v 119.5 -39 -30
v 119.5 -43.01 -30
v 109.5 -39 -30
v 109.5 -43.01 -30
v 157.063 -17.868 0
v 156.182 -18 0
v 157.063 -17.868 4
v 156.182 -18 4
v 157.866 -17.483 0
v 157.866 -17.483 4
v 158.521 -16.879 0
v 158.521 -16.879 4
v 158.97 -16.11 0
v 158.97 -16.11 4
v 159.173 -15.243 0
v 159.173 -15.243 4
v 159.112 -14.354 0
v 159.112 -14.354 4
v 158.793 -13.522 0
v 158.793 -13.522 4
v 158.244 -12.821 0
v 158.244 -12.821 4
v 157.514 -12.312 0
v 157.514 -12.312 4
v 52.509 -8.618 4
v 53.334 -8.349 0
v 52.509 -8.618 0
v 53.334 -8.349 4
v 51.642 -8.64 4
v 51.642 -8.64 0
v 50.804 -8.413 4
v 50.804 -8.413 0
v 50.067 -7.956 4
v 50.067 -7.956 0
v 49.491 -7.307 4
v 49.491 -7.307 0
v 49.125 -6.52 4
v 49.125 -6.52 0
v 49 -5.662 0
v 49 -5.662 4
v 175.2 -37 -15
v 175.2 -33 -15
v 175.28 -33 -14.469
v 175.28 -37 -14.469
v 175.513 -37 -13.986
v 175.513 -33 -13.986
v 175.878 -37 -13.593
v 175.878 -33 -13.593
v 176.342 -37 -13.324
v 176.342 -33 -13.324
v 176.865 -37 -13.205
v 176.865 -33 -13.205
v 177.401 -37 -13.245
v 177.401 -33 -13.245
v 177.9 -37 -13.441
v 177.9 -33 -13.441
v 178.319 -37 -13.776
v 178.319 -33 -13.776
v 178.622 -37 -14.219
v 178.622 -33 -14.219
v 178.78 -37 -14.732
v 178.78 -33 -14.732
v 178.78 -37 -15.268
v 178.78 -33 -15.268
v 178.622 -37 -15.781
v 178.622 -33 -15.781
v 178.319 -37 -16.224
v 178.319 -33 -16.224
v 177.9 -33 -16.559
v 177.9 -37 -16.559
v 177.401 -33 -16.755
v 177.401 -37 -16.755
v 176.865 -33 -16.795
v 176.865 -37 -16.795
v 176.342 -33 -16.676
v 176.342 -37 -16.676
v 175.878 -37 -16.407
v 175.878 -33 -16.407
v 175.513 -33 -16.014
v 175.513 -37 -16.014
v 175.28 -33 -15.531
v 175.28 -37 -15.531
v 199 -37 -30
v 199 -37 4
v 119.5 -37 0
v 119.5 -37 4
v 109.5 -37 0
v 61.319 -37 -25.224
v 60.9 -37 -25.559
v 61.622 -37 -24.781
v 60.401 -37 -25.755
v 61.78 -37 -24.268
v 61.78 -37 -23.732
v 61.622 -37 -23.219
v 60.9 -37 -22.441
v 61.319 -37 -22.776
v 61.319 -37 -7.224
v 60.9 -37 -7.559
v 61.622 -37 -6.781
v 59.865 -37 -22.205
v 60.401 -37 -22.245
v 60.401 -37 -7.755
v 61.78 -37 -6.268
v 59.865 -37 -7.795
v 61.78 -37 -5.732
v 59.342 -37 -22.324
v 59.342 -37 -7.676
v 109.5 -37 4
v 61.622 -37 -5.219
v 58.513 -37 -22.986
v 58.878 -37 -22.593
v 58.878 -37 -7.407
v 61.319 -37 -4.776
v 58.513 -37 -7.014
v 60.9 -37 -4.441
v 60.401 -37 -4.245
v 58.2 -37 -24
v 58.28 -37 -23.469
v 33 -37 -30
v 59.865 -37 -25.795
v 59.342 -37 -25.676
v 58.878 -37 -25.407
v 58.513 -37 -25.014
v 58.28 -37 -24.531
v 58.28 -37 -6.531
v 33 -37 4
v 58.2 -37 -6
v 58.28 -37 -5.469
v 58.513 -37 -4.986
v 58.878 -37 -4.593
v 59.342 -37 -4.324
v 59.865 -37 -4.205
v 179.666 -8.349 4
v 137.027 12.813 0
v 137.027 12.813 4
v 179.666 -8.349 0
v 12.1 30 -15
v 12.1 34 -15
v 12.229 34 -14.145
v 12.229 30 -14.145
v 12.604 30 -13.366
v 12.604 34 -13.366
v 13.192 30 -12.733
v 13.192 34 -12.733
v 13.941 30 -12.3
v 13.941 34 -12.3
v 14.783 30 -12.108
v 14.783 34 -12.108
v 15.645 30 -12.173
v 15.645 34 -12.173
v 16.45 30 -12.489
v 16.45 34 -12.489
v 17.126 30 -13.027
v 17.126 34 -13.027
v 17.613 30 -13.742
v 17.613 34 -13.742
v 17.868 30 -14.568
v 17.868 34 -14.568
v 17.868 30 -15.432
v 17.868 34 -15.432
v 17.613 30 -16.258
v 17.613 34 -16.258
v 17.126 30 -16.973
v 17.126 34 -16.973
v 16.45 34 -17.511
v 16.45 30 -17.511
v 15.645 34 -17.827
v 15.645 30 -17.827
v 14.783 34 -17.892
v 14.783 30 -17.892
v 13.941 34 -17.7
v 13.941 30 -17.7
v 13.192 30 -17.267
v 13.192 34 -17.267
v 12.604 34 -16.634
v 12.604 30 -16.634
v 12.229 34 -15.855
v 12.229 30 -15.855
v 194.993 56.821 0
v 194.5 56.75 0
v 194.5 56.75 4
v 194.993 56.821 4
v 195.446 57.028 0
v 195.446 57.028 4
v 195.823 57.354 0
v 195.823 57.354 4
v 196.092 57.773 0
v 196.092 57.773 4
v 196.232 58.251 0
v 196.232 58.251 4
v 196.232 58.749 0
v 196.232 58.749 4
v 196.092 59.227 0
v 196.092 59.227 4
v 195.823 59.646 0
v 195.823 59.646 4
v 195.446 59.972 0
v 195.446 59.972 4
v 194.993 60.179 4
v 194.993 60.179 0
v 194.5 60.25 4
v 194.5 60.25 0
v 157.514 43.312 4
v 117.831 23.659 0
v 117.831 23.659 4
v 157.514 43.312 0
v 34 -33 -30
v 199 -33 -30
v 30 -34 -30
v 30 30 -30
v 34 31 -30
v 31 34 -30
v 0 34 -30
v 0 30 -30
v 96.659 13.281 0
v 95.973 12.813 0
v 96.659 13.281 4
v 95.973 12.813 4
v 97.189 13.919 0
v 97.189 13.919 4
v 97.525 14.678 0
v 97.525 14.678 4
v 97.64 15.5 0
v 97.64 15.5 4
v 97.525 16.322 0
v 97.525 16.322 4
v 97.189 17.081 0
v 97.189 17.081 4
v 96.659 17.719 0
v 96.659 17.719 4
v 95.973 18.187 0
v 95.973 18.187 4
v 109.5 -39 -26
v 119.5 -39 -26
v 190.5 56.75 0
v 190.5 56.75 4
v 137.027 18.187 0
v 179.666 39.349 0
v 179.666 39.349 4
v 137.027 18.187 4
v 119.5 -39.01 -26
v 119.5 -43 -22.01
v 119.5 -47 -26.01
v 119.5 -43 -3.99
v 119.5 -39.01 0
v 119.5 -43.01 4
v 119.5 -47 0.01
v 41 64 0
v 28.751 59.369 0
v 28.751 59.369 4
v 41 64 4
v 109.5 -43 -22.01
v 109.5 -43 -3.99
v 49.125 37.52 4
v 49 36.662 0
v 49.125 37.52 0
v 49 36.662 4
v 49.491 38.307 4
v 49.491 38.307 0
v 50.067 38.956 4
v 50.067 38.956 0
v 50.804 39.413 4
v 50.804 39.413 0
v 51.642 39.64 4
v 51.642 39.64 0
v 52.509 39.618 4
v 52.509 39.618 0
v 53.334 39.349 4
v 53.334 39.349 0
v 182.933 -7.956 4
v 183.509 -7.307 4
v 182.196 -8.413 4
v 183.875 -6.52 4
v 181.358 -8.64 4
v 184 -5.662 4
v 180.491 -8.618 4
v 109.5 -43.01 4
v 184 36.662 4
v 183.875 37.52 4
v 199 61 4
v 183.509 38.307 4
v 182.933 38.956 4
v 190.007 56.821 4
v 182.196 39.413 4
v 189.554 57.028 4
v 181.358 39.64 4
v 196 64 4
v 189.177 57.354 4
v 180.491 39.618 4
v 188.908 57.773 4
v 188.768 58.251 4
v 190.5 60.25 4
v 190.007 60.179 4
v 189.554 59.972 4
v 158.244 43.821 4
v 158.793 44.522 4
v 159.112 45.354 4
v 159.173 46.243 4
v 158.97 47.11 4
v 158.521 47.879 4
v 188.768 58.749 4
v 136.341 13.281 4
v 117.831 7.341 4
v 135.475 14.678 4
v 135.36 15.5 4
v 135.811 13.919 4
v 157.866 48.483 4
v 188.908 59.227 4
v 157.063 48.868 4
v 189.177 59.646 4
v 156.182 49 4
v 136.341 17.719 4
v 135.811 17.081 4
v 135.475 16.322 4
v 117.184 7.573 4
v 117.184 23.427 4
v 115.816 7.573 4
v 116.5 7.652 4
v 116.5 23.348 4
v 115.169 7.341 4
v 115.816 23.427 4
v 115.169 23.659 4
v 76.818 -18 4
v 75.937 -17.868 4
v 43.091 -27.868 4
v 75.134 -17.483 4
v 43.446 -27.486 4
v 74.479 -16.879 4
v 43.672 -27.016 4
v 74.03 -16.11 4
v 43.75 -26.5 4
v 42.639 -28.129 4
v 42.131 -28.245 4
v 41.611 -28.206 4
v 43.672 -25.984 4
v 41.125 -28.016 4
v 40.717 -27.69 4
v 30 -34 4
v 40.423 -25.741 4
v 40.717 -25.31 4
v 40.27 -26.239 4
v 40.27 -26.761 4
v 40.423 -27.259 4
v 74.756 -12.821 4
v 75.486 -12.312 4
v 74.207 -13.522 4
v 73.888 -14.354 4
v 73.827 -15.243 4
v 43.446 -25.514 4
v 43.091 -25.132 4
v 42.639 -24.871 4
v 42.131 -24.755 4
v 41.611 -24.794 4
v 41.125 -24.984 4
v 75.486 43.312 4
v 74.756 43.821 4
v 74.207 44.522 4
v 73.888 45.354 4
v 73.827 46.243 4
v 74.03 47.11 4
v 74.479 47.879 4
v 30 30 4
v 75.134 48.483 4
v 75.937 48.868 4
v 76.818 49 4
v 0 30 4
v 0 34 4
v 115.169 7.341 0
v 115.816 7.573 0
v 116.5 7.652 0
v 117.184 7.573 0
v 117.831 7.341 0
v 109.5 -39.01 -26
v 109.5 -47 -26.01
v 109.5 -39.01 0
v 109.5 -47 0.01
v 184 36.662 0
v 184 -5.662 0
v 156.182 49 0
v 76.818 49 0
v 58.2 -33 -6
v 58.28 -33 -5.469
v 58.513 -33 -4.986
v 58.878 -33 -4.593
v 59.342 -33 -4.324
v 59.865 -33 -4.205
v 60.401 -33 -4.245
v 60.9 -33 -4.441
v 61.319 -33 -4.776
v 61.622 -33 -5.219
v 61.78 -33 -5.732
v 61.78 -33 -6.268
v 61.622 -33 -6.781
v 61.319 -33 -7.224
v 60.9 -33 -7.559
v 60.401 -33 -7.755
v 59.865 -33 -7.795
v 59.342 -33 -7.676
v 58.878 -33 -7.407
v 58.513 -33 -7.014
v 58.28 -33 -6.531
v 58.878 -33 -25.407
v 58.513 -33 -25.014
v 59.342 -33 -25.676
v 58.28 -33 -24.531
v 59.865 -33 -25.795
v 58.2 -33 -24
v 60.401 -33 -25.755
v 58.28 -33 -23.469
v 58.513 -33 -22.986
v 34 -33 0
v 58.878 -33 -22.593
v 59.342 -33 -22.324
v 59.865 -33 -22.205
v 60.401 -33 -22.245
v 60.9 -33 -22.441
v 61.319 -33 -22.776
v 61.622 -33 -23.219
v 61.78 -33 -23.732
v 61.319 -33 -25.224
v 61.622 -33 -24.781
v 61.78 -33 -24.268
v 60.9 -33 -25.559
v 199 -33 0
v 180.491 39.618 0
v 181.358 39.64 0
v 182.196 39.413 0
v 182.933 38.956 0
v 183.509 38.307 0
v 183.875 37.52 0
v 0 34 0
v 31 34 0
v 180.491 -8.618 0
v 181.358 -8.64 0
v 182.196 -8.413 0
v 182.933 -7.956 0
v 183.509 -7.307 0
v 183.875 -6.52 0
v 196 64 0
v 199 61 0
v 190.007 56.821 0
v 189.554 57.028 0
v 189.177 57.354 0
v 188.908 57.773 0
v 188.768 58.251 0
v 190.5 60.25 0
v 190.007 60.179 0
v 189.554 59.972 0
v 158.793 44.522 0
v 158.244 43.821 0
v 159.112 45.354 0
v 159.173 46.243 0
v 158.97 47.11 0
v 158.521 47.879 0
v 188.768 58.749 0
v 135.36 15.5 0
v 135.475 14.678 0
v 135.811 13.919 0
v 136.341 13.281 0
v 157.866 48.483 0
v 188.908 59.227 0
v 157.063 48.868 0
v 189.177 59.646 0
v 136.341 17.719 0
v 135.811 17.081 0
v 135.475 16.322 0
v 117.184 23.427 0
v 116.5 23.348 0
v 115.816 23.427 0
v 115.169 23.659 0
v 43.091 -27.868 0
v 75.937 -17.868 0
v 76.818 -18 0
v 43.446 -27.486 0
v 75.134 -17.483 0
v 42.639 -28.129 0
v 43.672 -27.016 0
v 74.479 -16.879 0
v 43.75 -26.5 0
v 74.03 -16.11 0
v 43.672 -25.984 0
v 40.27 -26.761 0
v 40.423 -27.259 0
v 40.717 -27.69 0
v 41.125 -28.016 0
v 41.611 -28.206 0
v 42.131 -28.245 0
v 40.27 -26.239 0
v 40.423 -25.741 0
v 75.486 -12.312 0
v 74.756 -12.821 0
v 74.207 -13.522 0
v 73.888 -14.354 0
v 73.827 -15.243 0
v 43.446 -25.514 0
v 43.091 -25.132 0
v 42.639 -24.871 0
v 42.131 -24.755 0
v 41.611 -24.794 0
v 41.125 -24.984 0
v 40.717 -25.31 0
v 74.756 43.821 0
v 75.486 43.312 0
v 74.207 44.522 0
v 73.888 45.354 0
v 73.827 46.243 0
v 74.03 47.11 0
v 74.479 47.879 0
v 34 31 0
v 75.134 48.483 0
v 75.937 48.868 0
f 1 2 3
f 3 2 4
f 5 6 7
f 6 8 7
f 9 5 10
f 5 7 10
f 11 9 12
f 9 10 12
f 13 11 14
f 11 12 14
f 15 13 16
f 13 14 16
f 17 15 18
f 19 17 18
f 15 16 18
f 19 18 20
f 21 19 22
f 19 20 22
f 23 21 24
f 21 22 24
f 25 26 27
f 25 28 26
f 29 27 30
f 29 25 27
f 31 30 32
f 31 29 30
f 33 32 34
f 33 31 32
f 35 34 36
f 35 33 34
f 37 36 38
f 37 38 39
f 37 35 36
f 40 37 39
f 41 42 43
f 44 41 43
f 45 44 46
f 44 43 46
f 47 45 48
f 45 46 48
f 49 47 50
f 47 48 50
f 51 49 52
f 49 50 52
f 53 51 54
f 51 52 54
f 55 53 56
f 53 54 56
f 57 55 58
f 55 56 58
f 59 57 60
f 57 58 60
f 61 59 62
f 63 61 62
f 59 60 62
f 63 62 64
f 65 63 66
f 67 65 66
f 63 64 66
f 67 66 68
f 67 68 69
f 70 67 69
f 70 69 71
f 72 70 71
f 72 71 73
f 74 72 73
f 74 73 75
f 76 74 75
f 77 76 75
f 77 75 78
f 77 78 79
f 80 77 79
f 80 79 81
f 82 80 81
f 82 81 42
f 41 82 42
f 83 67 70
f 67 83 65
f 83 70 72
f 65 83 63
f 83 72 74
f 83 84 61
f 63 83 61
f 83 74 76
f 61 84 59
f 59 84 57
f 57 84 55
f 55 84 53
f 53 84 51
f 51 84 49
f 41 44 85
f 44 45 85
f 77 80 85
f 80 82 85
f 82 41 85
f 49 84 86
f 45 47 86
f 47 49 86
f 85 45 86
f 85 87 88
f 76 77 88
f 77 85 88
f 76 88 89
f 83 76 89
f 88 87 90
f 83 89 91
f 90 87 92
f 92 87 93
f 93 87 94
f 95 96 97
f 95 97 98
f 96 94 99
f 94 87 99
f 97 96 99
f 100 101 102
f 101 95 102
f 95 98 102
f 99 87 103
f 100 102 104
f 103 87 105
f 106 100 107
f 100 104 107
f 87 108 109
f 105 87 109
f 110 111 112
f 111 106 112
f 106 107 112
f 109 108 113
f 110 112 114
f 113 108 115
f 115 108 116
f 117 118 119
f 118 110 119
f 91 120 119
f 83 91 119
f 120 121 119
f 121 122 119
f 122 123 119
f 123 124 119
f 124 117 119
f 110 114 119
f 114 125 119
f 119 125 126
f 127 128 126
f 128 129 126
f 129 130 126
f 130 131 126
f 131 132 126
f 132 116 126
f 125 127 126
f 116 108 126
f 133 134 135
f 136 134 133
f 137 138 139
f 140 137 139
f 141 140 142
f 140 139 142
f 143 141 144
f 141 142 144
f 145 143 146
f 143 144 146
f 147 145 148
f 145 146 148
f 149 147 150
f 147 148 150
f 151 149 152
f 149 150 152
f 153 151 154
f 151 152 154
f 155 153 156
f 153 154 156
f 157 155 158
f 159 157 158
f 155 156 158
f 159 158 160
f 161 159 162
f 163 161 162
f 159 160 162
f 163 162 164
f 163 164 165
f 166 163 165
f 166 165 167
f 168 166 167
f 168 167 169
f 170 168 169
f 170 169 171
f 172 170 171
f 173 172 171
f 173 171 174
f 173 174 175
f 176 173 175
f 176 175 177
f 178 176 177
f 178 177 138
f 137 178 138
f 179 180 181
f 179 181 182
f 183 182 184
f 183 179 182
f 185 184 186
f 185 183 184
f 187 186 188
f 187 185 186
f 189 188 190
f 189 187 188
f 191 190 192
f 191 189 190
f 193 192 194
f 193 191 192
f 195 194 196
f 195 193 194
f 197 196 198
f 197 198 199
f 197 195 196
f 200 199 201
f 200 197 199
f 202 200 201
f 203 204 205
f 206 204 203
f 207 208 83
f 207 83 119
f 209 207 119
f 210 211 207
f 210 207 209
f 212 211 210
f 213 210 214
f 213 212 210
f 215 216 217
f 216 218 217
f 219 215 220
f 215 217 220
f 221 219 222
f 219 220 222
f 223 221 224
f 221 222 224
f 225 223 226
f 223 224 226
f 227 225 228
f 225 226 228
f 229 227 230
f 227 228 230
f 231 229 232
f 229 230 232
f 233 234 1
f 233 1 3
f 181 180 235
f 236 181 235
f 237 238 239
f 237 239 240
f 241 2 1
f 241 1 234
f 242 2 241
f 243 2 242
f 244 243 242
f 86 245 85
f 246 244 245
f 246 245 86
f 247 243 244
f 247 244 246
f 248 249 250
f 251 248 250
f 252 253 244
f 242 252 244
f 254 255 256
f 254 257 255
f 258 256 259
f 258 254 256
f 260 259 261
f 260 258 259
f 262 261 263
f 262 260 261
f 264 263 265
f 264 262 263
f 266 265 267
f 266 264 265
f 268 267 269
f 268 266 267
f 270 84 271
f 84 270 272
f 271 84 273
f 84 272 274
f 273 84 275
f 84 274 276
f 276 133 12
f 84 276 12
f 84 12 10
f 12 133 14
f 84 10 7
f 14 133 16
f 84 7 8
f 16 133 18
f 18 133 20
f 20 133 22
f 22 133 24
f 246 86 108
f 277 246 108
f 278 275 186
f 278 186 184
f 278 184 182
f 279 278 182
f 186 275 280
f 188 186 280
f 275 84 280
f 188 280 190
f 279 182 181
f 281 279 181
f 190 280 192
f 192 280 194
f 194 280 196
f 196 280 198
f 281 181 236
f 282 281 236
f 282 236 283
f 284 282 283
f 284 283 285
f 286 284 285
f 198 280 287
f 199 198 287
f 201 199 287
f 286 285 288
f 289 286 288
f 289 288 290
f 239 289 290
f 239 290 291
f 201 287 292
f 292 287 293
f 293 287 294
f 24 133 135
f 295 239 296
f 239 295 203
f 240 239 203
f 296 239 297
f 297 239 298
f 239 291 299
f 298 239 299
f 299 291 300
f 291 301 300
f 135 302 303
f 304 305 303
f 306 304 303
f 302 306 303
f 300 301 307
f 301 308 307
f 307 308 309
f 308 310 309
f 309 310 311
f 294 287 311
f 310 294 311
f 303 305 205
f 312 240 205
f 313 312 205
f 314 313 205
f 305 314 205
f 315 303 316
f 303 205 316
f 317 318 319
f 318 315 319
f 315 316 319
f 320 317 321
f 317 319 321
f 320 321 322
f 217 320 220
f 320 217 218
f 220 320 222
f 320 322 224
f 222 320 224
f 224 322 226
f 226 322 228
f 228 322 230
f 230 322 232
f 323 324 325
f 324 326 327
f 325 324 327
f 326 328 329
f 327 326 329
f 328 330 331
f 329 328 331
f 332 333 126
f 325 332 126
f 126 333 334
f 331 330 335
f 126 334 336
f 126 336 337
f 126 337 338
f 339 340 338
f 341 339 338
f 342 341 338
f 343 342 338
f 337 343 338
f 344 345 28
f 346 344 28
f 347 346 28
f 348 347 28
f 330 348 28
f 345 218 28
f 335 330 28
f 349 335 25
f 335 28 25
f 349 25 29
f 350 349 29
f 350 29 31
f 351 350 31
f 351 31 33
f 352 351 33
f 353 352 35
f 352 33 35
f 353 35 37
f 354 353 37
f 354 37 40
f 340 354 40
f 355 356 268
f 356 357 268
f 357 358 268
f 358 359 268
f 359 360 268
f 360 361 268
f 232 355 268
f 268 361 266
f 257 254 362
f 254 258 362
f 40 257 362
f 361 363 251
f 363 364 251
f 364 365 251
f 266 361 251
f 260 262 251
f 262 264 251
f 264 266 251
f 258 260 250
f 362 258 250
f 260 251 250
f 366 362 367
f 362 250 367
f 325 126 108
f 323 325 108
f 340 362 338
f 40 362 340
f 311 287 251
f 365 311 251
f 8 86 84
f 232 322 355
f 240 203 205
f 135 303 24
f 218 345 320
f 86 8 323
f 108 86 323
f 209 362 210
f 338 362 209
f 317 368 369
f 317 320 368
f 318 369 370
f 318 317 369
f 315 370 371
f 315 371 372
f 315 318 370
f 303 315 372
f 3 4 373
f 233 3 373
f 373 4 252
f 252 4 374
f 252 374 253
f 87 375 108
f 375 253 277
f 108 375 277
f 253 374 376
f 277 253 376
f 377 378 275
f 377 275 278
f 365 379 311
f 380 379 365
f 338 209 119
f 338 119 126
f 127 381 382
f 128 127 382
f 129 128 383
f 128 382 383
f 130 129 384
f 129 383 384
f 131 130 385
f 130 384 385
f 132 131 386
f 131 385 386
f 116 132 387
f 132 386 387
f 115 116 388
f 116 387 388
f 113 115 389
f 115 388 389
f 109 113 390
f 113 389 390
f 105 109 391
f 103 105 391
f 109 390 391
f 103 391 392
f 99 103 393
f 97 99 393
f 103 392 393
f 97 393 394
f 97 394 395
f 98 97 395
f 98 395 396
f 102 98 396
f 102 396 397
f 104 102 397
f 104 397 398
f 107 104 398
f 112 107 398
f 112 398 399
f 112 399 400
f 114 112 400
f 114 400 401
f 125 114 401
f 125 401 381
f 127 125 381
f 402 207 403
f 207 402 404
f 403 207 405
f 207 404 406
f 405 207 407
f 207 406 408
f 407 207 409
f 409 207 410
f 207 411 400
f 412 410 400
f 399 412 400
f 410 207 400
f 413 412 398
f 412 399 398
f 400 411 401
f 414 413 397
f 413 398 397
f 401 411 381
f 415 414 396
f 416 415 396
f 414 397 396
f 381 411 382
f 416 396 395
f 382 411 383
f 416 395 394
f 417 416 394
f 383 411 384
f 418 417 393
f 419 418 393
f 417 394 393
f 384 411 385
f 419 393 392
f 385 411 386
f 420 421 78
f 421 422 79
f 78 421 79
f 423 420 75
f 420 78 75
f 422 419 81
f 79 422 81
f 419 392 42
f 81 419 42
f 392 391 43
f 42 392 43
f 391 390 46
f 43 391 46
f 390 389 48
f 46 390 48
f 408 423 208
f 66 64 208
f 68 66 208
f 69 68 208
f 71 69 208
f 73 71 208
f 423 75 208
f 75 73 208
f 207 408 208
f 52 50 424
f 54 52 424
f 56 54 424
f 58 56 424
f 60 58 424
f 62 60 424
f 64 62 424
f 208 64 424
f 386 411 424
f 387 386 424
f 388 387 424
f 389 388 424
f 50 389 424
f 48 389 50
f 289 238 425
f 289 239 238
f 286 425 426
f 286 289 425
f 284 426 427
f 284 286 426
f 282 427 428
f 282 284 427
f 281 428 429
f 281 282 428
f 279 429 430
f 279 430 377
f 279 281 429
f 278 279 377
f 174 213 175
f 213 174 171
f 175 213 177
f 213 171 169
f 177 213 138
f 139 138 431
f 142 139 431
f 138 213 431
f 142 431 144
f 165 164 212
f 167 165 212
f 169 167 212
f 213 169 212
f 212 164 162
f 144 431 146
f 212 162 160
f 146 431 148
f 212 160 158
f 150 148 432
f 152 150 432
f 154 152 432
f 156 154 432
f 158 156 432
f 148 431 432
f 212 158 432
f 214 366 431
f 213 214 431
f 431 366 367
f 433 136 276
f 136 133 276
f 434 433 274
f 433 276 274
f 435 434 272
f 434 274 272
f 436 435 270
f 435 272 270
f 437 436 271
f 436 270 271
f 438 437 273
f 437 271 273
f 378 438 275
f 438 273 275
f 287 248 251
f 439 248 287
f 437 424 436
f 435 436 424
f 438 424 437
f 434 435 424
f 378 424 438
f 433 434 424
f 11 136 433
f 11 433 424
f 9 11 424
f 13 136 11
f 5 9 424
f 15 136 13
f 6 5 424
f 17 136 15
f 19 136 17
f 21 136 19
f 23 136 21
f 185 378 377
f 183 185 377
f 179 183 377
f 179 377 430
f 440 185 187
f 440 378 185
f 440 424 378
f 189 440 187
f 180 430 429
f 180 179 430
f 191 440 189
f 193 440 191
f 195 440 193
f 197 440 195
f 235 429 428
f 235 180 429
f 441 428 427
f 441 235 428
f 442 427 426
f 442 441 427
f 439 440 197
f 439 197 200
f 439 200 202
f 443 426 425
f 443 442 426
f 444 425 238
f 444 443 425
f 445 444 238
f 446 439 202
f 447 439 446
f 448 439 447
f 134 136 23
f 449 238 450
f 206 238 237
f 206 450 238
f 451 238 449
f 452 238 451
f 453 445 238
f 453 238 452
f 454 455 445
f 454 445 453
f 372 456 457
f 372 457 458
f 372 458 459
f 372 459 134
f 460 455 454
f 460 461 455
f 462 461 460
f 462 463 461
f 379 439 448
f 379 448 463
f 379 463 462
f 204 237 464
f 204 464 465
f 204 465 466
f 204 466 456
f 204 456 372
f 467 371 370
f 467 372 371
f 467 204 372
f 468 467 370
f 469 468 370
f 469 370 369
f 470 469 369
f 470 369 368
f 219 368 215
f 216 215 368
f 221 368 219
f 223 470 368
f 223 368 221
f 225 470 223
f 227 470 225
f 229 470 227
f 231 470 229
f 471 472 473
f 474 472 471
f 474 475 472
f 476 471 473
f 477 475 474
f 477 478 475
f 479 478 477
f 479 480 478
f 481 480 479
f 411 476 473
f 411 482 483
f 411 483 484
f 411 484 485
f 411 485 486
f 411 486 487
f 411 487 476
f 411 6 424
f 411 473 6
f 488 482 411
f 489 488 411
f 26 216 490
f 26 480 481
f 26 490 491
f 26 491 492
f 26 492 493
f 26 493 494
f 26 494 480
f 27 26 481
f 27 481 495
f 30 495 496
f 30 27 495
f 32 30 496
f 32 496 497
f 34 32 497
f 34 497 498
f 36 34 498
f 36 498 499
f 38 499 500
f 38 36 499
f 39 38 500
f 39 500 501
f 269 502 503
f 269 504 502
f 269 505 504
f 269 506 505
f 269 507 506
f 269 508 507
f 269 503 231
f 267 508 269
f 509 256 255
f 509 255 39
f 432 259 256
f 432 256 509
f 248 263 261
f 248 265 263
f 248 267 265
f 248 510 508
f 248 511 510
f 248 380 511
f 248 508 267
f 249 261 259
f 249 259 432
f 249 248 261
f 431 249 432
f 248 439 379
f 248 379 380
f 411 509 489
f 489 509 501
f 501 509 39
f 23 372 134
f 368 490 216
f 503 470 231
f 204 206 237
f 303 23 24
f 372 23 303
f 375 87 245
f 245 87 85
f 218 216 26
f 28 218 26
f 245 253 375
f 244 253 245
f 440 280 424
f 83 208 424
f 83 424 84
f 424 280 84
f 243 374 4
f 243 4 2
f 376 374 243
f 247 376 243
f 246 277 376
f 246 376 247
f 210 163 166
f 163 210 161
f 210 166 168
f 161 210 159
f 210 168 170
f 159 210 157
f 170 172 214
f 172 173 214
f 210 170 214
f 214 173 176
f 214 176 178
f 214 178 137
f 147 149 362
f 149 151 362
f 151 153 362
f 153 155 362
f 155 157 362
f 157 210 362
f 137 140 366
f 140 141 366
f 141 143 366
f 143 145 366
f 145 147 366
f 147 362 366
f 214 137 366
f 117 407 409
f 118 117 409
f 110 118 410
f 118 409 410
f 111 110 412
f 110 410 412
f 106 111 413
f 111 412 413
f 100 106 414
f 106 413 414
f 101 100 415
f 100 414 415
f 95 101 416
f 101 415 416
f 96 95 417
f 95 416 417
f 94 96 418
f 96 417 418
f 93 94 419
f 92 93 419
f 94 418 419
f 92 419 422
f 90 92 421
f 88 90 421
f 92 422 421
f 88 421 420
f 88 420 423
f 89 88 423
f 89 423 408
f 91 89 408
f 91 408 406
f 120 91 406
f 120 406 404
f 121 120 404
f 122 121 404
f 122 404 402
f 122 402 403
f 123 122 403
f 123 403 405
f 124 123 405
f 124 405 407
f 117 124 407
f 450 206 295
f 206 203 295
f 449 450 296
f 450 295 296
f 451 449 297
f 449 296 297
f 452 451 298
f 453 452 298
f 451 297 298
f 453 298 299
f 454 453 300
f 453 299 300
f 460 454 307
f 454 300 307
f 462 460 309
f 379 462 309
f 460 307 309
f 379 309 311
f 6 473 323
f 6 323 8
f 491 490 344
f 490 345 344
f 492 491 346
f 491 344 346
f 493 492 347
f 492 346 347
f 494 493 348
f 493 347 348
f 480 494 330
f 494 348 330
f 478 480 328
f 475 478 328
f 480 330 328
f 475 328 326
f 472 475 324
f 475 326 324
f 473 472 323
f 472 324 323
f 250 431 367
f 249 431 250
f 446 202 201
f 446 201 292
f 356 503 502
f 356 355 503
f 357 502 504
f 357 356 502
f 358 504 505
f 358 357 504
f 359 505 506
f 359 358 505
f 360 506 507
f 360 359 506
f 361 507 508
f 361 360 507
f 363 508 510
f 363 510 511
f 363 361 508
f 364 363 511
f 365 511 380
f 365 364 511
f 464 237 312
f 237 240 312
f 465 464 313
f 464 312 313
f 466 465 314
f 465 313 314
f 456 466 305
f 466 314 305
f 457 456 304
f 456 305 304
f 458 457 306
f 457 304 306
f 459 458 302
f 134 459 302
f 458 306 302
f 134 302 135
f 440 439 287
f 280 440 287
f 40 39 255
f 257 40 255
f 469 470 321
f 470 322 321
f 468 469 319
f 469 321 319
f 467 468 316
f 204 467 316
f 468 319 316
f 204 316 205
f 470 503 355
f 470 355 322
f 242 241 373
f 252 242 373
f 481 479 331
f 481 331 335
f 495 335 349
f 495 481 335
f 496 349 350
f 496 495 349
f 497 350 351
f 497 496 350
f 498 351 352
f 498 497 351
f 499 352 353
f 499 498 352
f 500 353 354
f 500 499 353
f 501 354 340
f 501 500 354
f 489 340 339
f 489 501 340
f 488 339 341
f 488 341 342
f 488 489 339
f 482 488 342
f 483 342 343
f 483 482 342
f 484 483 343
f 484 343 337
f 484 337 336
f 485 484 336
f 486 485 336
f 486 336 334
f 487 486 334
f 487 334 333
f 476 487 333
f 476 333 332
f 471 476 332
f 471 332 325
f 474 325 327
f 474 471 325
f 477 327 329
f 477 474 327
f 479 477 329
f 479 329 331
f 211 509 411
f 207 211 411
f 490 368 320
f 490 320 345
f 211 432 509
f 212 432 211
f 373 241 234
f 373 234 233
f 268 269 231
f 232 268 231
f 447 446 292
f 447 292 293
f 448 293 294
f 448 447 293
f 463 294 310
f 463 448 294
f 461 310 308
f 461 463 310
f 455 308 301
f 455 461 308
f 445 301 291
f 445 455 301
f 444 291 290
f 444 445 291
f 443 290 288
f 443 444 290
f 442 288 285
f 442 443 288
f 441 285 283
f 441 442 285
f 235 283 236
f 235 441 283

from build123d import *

# Parameters (mm, degrees)
SKETCH_R        = 1.75
PAD_DEPTH       = 4
PAD001_DEPTH    = 34
FILLET_R        = 3
CHAMFER_SIZE    = 3
SKETCH006_R     = 2.9
HOLE_DEPTH      = 25
HOLE_TIPS_R     = 2.9
SKETCH007_R     = 1.8
HOLE001_DEPTH   = 25
CHAMFER001_SIZE = 3
CHAMFER002_SIZE = 7
SKETCH008_W     = 10
SKETCH008_H     = 10
PAD002_DEPTH    = 4
SKETCH009_W     = 10
SKETCH009_H     = 4
PAD003_DEPTH    = 30
SKETCH010_W     = 10
SKETCH010_H     = 4
PAD004_DEPTH    = 4
CHAMFER003_SIZE = 3.99


with BuildPart() as part:
    # Sketch → Pad (new body)
    with BuildSketch(Plane.XY):
        Polygon((30, 0), (30, 30), (0, 30), (0, 34), (34, 64), (199, 64), (199, -33), (199, -37), (30, -37), (30, -33), align=None)
        with Locations((42, -26.5)):
            Circle(SKETCH_R, mode=Mode.SUBTRACT)
        Polygon((64, 49), (116.5, 23), (169, 49), align=None, mode=Mode.SUBTRACT)
        Polygon((116.5, 8), (64, -18), (169, -18), align=None, mode=Mode.SUBTRACT)
        Polygon((49, 41.5), (101.38806, 15.5), (49, -10.5), align=None, mode=Mode.SUBTRACT)
        Polygon((184, 41.5), (131.61194, 15.5), (184, -10.5), align=None, mode=Mode.SUBTRACT)
        with BuildLine():
            ThreePointArc((194.5, 56.75), (196.25, 58.5), (194.499999, 60.25))
            Line((194.5, 60.25), (190.5, 60.25))
            ThreePointArc((190.500001, 60.25), (188.75, 58.5), (190.5, 56.75))
            Line((194.5, 56.75), (190.5, 56.75))
        make_face(mode=Mode.SUBTRACT)
    extrude(amount=PAD_DEPTH)

    # Sketch001 (on Face24 of Pad) → Pad001 (join)
    with BuildSketch(Plane.XY.offset(4)):
        Polygon((30, 0), (30, 30), (0, 30), (0, 34), (34, 34), (34, -33), (199, -33), (199, -37), (30, -37), (30, -33), align=None)
    extrude(amount=-PAD001_DEPTH)

    # Fillet
    fillet_edges = [part.edges().sort_by_distance(p)[0] for p in [
        (49, 41.5, 2),
        (101.38806, 15.5, 2),
        (49, -10.5, 2),
        (64, -18, 2),
        (116.5, 8, 2),
        (169, -18, 2),
        (184, -10.5, 2),
        (64, 49, 2),
        (116.5, 23, 2),
        (131.61194, 15.5, 2),
        (184, 41.5, 2),
        (169, 49, 2),
    ]]
    fillet(fillet_edges, radius=FILLET_R)

    # Chamfer
    chamfer_edges = [part.edges().sort_by_distance(p)[0] for p in [
        (199, 64, 2),
    ]]
    chamfer(chamfer_edges, length=CHAMFER_SIZE)

    # Sketch006 (on Face6 of Chamfer) → Hole (cut)
    with BuildSketch(Plane(origin=(0, 34, 0), x_dir=(-1, 0, 0), z_dir=(0, 1, 0))):
        with Locations((-15, -15)):
            Circle(SKETCH006_R)
    extrude(amount=-HOLE_DEPTH, mode=Mode.SUBTRACT)

    # Hole tips → Hole tip 1 section 0
    with BuildSketch(Plane(origin=(0, 9, 0), x_dir=(-1, 0, 0), z_dir=(0, 1, 0)), mode=Mode.PRIVATE) as hole_tip_1_s0:
        with Locations((-15, -15)):
            Circle(HOLE_TIPS_R)
    loft([hole_tip_1_s0.sketch, Vertex(15, 7.257504, -15)], mode=Mode.SUBTRACT)

    # Sketch007 (on Face7 of Hole) → Hole001 (cut)
    with BuildSketch(Plane(origin=(0, -33, 0), x_dir=(-1, 0, 0), z_dir=(0, 1, 0))):
        with Locations((-177, -15)):
            Circle(SKETCH007_R)
        with Locations((-60, -6)):
            Circle(SKETCH007_R)
        with Locations((-60, -24)):
            Circle(SKETCH007_R)
    extrude(amount=-HOLE001_DEPTH, mode=Mode.SUBTRACT)

    # Chamfer001
    chamfer001_edges = [part.edges().sort_by_distance(p)[0] for p in [
        (30, -37, -13),
        (34, 34, -15),
    ]]
    chamfer(chamfer001_edges, length=CHAMFER001_SIZE)

    # Chamfer002
    chamfer002_edges = [part.edges().sort_by_distance(p)[0] for p in [
        (34, 64, 2),
    ]]
    chamfer(chamfer002_edges, length=CHAMFER002_SIZE)

    # Sketch008 (on Face41 of Chamfer002) → Pad002 (join)
    with BuildSketch(Plane.XY.offset(4)):
        with Locations((114.5, -42)):
            Rectangle(SKETCH008_W, SKETCH008_H)
    extrude(amount=-PAD002_DEPTH)

    # Sketch009 (on Face51 of Pad002) → Pad003 (join)
    with BuildSketch(Plane(origin=(0, 0, 0), x_dir=(1, 0, 0), z_dir=(0, 0, -1))):
        with Locations((114.5, 45)):
            Rectangle(SKETCH009_W, SKETCH009_H)
    extrude(amount=PAD003_DEPTH)

    # Sketch010 (on Face52 of Pad003) → Pad004 (join)
    with BuildSketch(Plane(origin=(0, -43, 0), x_dir=(-1, 0, 0), z_dir=(0, 1, 0))):
        with Locations((-114.5, -28)):
            Rectangle(SKETCH010_W, SKETCH010_H)
    extrude(amount=PAD004_DEPTH)

    # Chamfer003
    chamfer003_edges = [part.edges().sort_by_distance(p)[0] for p in [
        (114.5, -47, 4),
        (114.5, -47, -30),
        (114.5, -43, -26),
        (114.5, -43, 0),
    ]]
    chamfer(chamfer003_edges, length=CHAMFER003_SIZE)


solid = part.part
